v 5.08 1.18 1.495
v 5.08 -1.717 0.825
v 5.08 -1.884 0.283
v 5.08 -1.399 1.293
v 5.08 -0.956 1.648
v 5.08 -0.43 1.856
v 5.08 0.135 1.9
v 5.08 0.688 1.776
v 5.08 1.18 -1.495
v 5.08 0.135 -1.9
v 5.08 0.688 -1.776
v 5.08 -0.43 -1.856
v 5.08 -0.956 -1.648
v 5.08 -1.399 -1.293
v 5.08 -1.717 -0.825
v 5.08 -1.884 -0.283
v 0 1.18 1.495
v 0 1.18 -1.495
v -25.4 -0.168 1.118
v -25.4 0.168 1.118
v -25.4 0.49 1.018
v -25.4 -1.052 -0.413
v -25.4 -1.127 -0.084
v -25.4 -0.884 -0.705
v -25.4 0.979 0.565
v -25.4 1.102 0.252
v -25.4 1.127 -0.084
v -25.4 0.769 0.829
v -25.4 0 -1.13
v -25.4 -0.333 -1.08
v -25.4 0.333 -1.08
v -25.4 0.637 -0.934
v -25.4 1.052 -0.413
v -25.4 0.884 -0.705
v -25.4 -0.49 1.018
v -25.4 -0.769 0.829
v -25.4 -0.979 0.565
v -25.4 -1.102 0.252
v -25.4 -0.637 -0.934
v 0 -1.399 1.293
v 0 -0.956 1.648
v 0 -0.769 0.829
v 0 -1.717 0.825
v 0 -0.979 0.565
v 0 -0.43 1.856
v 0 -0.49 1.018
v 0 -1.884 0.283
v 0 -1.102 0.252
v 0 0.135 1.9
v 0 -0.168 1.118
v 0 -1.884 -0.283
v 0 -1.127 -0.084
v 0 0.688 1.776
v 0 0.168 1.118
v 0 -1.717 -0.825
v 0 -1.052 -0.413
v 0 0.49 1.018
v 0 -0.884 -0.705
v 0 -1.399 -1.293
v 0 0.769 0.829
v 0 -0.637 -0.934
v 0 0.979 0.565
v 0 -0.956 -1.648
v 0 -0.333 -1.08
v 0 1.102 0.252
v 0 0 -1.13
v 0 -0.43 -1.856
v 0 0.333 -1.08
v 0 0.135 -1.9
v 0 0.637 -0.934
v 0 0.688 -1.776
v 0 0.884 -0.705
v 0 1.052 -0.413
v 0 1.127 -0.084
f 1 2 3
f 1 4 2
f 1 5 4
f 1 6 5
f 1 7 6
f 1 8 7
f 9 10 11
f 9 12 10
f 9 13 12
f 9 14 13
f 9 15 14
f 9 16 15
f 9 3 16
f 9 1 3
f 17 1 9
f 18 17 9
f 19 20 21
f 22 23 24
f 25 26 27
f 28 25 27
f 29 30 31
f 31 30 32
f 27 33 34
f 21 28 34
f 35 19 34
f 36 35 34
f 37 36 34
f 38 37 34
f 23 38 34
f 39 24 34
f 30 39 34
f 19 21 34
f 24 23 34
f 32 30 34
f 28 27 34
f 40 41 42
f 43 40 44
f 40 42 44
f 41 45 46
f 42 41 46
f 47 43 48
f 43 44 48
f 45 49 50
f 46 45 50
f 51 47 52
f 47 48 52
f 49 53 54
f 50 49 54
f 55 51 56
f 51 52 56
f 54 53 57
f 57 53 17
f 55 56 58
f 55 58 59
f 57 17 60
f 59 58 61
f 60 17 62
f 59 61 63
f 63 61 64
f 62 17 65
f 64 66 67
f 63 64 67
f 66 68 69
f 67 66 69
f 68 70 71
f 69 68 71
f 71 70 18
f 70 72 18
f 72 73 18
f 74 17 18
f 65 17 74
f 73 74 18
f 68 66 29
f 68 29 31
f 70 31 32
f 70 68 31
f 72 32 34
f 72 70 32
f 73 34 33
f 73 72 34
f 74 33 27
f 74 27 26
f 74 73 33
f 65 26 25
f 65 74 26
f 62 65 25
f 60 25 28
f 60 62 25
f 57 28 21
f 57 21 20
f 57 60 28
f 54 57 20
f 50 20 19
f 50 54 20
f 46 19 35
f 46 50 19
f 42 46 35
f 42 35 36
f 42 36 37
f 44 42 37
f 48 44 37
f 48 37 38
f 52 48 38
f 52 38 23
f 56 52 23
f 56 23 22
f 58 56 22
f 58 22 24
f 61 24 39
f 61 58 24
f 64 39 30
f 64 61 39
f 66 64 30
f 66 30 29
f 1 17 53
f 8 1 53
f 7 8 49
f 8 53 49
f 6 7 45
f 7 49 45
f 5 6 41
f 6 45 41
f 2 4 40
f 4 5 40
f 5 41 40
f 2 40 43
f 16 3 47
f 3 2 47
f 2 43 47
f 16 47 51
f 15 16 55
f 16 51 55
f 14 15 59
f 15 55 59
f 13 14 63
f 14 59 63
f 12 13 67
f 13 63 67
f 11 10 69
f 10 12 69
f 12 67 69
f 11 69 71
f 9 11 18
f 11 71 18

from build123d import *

# Parameters (mm, degrees)
SKETCH2_R           = 1.1303
BOSS_EXTRUDE1_DEPTH = 25.4
SKETCH3_R           = 1.905
BOSS_EXTRUDE2_DEPTH = 5.08
CUT_EXTRUDE1_DEPTH  = 5.08


with BuildPart() as part:
    # Sketch2 → Boss-Extrude1 (new body)
    with BuildSketch(Plane(origin=(0, 0, 0), x_dir=(0, 0, -1), z_dir=(1, 0, 0))):
        Circle(SKETCH2_R)
    extrude(amount=-BOSS_EXTRUDE1_DEPTH)

    # Sketch3 → Boss-Extrude2 (add)
    with BuildSketch(Plane(origin=(0, 0, 0), x_dir=(0, 0, -1), z_dir=(1, 0, 0))):
        Circle(SKETCH3_R)
    extrude(amount=BOSS_EXTRUDE2_DEPTH)

    # Sketch4 → Cut-Extrude1 (cut)
    with BuildSketch(Plane(origin=(5.08, 0, 0), x_dir=(0, 0, -1), z_dir=(1, 0, 0))):
        with BuildLine():
            Line((-1.495366573, 1.18021346), (1.495366573, 1.18021346))
            ThreePointArc((1.495366573, 1.18021346), (0, 1.905), (-1.495366573, 1.18021346))
        make_face()
    extrude(amount=-CUT_EXTRUDE1_DEPTH, mode=Mode.SUBTRACT)


solid = part.part
